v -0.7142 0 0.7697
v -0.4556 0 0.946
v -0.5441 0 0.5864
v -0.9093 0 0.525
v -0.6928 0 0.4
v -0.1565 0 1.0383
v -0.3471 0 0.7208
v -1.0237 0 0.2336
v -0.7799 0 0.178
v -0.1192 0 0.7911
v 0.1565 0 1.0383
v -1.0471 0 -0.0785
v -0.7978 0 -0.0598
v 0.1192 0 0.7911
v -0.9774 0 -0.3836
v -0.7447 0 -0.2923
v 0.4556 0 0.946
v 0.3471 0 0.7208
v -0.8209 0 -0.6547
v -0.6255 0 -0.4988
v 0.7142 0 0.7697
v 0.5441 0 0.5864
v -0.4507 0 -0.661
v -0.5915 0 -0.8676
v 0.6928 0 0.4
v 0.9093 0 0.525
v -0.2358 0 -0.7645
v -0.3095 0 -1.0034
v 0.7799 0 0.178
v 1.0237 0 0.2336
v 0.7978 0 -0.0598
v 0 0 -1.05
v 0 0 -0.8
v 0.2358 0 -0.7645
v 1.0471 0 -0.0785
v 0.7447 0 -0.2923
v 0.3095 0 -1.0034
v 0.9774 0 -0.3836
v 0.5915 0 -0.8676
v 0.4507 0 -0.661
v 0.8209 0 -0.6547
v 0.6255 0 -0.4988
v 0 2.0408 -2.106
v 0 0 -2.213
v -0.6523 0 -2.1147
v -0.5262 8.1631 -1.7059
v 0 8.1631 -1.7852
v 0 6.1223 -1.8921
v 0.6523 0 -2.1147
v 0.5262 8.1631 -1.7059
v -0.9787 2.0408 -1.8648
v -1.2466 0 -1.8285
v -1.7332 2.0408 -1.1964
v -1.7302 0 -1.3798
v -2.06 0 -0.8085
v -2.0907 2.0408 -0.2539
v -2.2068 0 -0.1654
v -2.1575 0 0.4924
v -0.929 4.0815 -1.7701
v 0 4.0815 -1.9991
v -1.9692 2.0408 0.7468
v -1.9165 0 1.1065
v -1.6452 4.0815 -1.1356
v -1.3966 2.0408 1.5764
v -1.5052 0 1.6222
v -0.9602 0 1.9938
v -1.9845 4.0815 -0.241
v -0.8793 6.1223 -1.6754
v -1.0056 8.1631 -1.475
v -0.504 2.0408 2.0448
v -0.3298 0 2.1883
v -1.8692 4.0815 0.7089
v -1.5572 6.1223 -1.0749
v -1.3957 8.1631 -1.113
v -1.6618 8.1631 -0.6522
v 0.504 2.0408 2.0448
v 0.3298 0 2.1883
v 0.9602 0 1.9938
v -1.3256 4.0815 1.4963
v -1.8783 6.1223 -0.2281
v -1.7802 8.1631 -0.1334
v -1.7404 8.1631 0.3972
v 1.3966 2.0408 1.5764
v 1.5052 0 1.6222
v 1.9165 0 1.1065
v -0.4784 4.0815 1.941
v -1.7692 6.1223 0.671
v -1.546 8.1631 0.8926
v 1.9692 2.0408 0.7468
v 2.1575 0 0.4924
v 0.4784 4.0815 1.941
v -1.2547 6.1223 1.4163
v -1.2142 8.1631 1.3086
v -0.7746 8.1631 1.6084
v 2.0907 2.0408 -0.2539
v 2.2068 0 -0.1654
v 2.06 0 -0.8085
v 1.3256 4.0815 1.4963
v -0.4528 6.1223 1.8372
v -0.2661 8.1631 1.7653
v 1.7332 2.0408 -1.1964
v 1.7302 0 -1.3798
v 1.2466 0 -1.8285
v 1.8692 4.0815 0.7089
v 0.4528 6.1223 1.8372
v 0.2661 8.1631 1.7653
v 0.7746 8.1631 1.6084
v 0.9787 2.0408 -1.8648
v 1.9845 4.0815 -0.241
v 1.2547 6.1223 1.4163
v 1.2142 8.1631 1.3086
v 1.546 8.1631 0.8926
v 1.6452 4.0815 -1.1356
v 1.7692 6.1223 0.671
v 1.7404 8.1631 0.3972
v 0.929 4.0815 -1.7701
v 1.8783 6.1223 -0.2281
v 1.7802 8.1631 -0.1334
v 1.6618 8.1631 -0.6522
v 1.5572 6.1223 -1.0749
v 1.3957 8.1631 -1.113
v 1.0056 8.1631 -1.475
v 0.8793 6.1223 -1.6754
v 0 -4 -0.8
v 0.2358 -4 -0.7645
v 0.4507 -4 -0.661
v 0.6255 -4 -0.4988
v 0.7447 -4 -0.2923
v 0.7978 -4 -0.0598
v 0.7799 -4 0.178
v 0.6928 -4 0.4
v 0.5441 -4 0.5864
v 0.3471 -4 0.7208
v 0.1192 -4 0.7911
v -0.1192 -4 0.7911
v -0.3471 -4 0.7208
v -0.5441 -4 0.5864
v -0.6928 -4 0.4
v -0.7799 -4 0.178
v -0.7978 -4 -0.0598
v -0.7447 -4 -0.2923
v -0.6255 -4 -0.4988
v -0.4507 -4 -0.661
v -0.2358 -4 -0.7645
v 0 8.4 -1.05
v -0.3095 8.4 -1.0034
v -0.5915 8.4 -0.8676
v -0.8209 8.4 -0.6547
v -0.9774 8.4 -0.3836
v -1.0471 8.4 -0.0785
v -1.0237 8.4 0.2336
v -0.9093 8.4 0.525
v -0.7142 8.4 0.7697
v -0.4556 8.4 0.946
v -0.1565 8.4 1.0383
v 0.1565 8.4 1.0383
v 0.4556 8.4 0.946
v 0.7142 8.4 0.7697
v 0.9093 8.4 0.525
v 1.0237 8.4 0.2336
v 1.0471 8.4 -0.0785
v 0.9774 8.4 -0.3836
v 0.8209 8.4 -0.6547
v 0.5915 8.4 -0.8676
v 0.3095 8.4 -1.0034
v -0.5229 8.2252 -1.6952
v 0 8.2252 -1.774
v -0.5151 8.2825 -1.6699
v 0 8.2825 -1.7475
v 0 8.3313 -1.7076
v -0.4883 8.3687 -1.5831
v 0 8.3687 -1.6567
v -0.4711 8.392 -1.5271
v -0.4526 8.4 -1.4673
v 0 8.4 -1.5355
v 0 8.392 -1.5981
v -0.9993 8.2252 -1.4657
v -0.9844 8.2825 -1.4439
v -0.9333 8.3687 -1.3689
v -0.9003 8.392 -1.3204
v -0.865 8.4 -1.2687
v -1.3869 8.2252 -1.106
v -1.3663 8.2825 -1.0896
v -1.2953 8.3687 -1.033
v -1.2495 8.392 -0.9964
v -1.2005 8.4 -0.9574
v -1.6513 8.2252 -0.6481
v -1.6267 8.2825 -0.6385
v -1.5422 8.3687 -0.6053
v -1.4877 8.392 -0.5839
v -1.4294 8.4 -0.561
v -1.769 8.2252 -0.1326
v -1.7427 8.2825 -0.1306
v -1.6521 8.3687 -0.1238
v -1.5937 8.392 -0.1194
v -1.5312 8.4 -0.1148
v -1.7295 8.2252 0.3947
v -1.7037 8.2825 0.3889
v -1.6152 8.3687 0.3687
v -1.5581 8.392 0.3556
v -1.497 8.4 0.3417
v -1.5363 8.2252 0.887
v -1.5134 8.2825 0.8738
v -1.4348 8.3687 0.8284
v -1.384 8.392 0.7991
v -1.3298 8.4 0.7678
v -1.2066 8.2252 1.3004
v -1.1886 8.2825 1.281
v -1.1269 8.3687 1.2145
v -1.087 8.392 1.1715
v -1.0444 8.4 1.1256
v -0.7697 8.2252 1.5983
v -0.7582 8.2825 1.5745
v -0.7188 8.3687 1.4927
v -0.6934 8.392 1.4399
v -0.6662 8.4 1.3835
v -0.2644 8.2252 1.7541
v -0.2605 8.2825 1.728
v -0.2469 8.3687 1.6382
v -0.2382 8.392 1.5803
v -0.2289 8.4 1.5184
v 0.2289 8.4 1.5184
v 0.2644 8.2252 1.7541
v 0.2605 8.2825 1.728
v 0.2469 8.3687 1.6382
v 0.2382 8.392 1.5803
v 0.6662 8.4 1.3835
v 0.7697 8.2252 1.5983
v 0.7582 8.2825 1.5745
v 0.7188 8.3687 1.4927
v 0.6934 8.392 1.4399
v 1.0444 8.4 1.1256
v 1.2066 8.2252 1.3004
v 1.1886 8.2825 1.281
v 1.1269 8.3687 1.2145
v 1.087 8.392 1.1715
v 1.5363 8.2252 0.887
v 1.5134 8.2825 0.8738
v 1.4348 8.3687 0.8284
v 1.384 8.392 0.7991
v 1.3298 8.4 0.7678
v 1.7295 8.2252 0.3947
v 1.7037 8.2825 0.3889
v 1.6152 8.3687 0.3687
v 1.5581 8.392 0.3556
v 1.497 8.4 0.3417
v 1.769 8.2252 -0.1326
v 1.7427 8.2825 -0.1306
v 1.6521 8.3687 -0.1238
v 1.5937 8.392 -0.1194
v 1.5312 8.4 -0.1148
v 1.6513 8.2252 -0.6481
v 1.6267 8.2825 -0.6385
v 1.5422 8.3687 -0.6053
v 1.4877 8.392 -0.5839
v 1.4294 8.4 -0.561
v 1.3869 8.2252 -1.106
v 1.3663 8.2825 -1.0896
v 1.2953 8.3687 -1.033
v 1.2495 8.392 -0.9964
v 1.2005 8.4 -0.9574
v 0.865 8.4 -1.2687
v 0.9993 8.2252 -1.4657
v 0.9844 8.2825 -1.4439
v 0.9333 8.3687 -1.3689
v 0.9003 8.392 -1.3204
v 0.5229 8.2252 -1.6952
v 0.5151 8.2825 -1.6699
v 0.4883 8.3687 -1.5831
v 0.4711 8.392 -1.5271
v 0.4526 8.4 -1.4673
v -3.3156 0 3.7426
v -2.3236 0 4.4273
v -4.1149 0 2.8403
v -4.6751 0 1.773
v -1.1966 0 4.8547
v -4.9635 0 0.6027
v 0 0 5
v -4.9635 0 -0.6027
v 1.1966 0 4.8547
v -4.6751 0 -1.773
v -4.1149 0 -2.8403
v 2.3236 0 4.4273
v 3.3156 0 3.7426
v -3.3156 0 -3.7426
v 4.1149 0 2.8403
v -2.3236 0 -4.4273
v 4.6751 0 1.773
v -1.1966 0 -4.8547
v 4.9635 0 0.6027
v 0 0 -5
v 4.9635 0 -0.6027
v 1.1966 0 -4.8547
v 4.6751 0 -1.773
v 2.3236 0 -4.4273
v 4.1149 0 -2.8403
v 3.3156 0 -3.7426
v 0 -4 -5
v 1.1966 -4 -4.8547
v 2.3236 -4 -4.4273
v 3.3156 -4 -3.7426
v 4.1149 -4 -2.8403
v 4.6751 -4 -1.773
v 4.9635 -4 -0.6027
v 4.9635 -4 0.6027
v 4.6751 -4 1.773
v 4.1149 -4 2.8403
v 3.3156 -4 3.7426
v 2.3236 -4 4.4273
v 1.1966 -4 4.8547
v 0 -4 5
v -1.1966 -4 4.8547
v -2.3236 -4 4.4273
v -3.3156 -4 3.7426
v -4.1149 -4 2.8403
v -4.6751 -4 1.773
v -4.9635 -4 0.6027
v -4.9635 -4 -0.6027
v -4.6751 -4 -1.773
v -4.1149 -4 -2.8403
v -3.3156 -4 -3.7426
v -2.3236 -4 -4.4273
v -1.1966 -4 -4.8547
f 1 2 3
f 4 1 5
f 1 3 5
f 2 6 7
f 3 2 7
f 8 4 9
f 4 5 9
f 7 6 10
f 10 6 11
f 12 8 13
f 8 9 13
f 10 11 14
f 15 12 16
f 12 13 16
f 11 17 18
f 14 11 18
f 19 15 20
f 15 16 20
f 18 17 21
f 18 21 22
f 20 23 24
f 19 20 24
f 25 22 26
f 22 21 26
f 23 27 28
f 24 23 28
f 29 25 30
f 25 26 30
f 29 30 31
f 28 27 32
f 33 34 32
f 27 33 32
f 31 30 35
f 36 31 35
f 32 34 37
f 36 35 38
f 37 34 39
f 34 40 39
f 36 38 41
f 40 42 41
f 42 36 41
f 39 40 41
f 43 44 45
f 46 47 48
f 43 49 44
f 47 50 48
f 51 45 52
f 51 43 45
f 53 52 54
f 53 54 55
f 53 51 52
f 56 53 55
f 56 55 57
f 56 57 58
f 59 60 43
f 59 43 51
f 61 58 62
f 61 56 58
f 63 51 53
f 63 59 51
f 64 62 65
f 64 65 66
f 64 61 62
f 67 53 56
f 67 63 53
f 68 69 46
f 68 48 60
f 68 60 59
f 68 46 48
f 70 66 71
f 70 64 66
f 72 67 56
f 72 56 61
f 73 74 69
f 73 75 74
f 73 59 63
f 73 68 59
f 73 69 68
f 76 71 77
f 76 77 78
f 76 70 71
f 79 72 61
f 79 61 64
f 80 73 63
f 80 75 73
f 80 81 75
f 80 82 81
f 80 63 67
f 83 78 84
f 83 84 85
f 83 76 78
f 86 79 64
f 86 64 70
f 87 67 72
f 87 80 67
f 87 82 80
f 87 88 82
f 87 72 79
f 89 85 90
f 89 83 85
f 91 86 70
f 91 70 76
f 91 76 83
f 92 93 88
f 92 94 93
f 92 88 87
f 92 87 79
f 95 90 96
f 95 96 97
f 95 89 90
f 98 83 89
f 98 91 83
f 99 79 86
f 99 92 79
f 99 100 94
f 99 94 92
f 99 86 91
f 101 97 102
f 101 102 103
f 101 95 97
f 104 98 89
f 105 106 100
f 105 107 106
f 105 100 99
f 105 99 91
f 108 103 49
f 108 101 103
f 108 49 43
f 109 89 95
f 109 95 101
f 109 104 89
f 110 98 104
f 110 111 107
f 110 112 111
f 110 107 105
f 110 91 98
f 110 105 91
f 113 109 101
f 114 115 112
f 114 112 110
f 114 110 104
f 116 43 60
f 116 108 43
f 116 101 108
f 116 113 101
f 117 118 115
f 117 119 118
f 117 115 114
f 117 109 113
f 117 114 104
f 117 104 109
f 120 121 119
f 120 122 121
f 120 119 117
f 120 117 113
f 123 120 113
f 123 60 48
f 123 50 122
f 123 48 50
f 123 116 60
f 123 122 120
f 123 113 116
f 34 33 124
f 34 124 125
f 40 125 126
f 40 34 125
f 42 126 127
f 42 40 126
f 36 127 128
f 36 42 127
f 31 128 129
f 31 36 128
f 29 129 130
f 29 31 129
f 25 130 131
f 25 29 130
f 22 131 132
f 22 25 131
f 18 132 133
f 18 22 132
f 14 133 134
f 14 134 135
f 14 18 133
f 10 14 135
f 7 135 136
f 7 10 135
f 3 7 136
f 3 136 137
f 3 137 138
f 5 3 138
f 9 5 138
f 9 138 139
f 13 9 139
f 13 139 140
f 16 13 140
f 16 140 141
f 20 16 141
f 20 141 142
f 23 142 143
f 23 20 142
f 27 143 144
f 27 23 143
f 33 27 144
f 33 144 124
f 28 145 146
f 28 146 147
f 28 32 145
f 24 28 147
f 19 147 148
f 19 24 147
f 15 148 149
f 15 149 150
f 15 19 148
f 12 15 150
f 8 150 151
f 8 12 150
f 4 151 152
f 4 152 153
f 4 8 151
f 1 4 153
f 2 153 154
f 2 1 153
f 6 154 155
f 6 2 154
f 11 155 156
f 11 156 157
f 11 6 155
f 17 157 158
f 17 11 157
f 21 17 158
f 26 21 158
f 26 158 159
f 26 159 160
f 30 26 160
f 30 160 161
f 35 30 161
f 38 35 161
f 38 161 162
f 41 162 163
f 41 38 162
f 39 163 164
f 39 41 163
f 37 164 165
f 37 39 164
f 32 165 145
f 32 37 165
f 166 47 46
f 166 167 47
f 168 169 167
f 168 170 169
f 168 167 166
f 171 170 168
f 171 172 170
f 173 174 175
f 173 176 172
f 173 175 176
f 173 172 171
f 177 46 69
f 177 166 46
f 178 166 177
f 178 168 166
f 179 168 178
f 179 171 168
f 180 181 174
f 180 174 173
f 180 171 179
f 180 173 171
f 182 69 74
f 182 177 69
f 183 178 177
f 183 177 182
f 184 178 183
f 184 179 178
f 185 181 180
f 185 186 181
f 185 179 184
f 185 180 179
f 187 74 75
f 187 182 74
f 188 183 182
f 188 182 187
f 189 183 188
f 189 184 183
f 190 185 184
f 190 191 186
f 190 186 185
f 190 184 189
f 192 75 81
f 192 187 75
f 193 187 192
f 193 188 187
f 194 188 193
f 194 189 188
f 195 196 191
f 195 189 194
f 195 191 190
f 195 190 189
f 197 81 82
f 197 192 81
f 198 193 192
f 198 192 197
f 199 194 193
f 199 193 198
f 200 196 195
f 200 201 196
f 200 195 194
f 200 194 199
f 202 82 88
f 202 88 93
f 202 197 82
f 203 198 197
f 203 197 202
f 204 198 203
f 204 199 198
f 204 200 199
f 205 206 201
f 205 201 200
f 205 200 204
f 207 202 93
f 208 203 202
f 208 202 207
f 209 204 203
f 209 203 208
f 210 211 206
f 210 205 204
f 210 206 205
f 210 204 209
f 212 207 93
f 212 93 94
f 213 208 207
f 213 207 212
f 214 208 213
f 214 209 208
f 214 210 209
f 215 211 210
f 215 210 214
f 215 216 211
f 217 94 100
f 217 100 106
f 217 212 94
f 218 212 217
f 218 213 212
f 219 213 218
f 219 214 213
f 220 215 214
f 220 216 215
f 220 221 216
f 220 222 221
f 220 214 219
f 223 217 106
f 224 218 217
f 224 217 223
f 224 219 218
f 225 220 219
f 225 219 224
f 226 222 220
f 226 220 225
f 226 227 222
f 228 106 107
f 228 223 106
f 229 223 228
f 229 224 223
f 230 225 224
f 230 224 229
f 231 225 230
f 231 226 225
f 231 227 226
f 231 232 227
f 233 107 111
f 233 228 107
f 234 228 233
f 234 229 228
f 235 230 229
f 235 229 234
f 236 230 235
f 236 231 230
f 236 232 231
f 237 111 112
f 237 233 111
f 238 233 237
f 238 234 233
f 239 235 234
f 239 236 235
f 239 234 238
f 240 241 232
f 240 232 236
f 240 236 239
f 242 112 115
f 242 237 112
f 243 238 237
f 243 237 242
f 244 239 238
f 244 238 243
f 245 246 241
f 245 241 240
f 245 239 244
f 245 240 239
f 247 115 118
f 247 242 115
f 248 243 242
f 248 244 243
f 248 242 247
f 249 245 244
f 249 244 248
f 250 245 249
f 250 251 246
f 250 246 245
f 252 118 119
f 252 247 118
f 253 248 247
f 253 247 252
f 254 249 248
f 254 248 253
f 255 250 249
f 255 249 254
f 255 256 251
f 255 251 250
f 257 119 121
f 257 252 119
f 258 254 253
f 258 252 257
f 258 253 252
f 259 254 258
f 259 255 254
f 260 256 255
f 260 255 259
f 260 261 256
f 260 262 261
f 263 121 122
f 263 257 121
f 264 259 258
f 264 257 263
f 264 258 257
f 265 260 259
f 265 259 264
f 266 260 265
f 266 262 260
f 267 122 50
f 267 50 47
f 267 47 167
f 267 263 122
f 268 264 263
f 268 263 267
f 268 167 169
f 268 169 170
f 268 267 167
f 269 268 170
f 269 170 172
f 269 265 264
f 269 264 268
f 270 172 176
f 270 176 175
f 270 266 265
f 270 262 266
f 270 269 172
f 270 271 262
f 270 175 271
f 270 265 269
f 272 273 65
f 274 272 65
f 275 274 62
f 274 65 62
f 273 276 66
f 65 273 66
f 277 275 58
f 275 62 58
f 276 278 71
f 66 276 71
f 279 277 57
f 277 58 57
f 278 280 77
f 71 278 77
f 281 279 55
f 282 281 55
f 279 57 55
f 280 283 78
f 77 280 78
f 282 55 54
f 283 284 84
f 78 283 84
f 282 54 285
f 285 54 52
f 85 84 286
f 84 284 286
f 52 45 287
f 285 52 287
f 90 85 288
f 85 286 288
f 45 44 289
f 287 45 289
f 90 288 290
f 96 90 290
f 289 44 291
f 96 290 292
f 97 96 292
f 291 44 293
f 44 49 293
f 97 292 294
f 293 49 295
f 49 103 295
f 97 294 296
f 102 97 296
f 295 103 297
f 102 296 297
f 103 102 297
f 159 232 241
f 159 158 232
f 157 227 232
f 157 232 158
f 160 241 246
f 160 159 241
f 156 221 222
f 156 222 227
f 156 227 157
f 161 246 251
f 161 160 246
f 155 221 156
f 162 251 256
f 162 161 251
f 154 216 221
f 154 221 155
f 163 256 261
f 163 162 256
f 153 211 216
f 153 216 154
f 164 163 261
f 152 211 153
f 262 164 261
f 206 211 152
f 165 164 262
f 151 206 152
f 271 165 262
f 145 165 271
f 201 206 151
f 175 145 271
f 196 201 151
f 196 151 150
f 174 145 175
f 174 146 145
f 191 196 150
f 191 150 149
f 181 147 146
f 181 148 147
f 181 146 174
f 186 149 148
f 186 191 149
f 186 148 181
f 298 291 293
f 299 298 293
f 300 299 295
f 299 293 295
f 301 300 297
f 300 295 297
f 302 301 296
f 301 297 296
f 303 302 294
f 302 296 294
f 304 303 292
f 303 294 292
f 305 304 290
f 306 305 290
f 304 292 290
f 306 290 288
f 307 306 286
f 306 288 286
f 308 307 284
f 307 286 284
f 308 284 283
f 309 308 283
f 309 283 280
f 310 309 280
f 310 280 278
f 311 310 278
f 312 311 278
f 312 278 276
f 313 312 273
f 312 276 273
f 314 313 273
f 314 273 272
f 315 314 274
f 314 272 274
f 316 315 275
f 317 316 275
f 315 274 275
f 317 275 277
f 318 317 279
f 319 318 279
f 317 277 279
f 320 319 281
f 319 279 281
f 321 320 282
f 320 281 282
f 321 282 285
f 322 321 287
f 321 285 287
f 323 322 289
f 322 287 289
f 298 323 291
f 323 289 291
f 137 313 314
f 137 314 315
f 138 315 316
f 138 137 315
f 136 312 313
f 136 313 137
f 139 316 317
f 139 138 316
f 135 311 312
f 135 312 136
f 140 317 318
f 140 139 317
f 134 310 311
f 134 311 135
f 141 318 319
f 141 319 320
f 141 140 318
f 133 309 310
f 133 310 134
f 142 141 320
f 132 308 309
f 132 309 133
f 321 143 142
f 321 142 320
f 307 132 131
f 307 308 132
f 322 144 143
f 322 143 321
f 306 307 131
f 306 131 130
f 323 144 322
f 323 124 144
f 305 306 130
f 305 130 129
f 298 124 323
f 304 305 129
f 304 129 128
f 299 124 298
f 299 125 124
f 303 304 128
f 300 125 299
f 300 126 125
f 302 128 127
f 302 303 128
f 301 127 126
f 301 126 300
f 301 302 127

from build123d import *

# Parameters (mm, degrees)
SKETCH3_R           = 5
SKETCH3_R_2         = 0.8
BOSS_EXTRUDE1_DEPTH = 4


with BuildPart() as part:
    # Sketch2 → luer (revolve)
    with BuildSketch(Plane.XY, mode=Mode.PRIVATE) as luer_sk:
        with BuildLine():
            Line((-1.05, 0), (-2.213, 0))
            Line((-2.213, 0), (-1.785190896, 8.163083989))
            ThreePointArc((-1.785190896, 8.163083989), (-1.707622156, 8.331343593), (-1.535533512, 8.4))
            Line((-1.535533512, 8.4), (-1.05, 8.4))
            Line((-1.05, 8.4), (-1.05, 0))
        make_face()
    revolve(luer_sk.sketch.rotate(Axis((0, 0, 0), (0, 1, 0)), 270), axis=Axis((0, 0, 0), (0, 1, 0)))

    # Sketch3 → Boss-Extrude1 (add)
    with BuildSketch(Plane.XZ):
        with Locations(Location((0, 0, 0), (0, 0, 270))):
            Circle(SKETCH3_R)
        with Locations(Location((0, 0, 0), (0, 0, 270))):
            Circle(SKETCH3_R_2, mode=Mode.SUBTRACT)
    extrude(amount=BOSS_EXTRUDE1_DEPTH)


solid = part.part
